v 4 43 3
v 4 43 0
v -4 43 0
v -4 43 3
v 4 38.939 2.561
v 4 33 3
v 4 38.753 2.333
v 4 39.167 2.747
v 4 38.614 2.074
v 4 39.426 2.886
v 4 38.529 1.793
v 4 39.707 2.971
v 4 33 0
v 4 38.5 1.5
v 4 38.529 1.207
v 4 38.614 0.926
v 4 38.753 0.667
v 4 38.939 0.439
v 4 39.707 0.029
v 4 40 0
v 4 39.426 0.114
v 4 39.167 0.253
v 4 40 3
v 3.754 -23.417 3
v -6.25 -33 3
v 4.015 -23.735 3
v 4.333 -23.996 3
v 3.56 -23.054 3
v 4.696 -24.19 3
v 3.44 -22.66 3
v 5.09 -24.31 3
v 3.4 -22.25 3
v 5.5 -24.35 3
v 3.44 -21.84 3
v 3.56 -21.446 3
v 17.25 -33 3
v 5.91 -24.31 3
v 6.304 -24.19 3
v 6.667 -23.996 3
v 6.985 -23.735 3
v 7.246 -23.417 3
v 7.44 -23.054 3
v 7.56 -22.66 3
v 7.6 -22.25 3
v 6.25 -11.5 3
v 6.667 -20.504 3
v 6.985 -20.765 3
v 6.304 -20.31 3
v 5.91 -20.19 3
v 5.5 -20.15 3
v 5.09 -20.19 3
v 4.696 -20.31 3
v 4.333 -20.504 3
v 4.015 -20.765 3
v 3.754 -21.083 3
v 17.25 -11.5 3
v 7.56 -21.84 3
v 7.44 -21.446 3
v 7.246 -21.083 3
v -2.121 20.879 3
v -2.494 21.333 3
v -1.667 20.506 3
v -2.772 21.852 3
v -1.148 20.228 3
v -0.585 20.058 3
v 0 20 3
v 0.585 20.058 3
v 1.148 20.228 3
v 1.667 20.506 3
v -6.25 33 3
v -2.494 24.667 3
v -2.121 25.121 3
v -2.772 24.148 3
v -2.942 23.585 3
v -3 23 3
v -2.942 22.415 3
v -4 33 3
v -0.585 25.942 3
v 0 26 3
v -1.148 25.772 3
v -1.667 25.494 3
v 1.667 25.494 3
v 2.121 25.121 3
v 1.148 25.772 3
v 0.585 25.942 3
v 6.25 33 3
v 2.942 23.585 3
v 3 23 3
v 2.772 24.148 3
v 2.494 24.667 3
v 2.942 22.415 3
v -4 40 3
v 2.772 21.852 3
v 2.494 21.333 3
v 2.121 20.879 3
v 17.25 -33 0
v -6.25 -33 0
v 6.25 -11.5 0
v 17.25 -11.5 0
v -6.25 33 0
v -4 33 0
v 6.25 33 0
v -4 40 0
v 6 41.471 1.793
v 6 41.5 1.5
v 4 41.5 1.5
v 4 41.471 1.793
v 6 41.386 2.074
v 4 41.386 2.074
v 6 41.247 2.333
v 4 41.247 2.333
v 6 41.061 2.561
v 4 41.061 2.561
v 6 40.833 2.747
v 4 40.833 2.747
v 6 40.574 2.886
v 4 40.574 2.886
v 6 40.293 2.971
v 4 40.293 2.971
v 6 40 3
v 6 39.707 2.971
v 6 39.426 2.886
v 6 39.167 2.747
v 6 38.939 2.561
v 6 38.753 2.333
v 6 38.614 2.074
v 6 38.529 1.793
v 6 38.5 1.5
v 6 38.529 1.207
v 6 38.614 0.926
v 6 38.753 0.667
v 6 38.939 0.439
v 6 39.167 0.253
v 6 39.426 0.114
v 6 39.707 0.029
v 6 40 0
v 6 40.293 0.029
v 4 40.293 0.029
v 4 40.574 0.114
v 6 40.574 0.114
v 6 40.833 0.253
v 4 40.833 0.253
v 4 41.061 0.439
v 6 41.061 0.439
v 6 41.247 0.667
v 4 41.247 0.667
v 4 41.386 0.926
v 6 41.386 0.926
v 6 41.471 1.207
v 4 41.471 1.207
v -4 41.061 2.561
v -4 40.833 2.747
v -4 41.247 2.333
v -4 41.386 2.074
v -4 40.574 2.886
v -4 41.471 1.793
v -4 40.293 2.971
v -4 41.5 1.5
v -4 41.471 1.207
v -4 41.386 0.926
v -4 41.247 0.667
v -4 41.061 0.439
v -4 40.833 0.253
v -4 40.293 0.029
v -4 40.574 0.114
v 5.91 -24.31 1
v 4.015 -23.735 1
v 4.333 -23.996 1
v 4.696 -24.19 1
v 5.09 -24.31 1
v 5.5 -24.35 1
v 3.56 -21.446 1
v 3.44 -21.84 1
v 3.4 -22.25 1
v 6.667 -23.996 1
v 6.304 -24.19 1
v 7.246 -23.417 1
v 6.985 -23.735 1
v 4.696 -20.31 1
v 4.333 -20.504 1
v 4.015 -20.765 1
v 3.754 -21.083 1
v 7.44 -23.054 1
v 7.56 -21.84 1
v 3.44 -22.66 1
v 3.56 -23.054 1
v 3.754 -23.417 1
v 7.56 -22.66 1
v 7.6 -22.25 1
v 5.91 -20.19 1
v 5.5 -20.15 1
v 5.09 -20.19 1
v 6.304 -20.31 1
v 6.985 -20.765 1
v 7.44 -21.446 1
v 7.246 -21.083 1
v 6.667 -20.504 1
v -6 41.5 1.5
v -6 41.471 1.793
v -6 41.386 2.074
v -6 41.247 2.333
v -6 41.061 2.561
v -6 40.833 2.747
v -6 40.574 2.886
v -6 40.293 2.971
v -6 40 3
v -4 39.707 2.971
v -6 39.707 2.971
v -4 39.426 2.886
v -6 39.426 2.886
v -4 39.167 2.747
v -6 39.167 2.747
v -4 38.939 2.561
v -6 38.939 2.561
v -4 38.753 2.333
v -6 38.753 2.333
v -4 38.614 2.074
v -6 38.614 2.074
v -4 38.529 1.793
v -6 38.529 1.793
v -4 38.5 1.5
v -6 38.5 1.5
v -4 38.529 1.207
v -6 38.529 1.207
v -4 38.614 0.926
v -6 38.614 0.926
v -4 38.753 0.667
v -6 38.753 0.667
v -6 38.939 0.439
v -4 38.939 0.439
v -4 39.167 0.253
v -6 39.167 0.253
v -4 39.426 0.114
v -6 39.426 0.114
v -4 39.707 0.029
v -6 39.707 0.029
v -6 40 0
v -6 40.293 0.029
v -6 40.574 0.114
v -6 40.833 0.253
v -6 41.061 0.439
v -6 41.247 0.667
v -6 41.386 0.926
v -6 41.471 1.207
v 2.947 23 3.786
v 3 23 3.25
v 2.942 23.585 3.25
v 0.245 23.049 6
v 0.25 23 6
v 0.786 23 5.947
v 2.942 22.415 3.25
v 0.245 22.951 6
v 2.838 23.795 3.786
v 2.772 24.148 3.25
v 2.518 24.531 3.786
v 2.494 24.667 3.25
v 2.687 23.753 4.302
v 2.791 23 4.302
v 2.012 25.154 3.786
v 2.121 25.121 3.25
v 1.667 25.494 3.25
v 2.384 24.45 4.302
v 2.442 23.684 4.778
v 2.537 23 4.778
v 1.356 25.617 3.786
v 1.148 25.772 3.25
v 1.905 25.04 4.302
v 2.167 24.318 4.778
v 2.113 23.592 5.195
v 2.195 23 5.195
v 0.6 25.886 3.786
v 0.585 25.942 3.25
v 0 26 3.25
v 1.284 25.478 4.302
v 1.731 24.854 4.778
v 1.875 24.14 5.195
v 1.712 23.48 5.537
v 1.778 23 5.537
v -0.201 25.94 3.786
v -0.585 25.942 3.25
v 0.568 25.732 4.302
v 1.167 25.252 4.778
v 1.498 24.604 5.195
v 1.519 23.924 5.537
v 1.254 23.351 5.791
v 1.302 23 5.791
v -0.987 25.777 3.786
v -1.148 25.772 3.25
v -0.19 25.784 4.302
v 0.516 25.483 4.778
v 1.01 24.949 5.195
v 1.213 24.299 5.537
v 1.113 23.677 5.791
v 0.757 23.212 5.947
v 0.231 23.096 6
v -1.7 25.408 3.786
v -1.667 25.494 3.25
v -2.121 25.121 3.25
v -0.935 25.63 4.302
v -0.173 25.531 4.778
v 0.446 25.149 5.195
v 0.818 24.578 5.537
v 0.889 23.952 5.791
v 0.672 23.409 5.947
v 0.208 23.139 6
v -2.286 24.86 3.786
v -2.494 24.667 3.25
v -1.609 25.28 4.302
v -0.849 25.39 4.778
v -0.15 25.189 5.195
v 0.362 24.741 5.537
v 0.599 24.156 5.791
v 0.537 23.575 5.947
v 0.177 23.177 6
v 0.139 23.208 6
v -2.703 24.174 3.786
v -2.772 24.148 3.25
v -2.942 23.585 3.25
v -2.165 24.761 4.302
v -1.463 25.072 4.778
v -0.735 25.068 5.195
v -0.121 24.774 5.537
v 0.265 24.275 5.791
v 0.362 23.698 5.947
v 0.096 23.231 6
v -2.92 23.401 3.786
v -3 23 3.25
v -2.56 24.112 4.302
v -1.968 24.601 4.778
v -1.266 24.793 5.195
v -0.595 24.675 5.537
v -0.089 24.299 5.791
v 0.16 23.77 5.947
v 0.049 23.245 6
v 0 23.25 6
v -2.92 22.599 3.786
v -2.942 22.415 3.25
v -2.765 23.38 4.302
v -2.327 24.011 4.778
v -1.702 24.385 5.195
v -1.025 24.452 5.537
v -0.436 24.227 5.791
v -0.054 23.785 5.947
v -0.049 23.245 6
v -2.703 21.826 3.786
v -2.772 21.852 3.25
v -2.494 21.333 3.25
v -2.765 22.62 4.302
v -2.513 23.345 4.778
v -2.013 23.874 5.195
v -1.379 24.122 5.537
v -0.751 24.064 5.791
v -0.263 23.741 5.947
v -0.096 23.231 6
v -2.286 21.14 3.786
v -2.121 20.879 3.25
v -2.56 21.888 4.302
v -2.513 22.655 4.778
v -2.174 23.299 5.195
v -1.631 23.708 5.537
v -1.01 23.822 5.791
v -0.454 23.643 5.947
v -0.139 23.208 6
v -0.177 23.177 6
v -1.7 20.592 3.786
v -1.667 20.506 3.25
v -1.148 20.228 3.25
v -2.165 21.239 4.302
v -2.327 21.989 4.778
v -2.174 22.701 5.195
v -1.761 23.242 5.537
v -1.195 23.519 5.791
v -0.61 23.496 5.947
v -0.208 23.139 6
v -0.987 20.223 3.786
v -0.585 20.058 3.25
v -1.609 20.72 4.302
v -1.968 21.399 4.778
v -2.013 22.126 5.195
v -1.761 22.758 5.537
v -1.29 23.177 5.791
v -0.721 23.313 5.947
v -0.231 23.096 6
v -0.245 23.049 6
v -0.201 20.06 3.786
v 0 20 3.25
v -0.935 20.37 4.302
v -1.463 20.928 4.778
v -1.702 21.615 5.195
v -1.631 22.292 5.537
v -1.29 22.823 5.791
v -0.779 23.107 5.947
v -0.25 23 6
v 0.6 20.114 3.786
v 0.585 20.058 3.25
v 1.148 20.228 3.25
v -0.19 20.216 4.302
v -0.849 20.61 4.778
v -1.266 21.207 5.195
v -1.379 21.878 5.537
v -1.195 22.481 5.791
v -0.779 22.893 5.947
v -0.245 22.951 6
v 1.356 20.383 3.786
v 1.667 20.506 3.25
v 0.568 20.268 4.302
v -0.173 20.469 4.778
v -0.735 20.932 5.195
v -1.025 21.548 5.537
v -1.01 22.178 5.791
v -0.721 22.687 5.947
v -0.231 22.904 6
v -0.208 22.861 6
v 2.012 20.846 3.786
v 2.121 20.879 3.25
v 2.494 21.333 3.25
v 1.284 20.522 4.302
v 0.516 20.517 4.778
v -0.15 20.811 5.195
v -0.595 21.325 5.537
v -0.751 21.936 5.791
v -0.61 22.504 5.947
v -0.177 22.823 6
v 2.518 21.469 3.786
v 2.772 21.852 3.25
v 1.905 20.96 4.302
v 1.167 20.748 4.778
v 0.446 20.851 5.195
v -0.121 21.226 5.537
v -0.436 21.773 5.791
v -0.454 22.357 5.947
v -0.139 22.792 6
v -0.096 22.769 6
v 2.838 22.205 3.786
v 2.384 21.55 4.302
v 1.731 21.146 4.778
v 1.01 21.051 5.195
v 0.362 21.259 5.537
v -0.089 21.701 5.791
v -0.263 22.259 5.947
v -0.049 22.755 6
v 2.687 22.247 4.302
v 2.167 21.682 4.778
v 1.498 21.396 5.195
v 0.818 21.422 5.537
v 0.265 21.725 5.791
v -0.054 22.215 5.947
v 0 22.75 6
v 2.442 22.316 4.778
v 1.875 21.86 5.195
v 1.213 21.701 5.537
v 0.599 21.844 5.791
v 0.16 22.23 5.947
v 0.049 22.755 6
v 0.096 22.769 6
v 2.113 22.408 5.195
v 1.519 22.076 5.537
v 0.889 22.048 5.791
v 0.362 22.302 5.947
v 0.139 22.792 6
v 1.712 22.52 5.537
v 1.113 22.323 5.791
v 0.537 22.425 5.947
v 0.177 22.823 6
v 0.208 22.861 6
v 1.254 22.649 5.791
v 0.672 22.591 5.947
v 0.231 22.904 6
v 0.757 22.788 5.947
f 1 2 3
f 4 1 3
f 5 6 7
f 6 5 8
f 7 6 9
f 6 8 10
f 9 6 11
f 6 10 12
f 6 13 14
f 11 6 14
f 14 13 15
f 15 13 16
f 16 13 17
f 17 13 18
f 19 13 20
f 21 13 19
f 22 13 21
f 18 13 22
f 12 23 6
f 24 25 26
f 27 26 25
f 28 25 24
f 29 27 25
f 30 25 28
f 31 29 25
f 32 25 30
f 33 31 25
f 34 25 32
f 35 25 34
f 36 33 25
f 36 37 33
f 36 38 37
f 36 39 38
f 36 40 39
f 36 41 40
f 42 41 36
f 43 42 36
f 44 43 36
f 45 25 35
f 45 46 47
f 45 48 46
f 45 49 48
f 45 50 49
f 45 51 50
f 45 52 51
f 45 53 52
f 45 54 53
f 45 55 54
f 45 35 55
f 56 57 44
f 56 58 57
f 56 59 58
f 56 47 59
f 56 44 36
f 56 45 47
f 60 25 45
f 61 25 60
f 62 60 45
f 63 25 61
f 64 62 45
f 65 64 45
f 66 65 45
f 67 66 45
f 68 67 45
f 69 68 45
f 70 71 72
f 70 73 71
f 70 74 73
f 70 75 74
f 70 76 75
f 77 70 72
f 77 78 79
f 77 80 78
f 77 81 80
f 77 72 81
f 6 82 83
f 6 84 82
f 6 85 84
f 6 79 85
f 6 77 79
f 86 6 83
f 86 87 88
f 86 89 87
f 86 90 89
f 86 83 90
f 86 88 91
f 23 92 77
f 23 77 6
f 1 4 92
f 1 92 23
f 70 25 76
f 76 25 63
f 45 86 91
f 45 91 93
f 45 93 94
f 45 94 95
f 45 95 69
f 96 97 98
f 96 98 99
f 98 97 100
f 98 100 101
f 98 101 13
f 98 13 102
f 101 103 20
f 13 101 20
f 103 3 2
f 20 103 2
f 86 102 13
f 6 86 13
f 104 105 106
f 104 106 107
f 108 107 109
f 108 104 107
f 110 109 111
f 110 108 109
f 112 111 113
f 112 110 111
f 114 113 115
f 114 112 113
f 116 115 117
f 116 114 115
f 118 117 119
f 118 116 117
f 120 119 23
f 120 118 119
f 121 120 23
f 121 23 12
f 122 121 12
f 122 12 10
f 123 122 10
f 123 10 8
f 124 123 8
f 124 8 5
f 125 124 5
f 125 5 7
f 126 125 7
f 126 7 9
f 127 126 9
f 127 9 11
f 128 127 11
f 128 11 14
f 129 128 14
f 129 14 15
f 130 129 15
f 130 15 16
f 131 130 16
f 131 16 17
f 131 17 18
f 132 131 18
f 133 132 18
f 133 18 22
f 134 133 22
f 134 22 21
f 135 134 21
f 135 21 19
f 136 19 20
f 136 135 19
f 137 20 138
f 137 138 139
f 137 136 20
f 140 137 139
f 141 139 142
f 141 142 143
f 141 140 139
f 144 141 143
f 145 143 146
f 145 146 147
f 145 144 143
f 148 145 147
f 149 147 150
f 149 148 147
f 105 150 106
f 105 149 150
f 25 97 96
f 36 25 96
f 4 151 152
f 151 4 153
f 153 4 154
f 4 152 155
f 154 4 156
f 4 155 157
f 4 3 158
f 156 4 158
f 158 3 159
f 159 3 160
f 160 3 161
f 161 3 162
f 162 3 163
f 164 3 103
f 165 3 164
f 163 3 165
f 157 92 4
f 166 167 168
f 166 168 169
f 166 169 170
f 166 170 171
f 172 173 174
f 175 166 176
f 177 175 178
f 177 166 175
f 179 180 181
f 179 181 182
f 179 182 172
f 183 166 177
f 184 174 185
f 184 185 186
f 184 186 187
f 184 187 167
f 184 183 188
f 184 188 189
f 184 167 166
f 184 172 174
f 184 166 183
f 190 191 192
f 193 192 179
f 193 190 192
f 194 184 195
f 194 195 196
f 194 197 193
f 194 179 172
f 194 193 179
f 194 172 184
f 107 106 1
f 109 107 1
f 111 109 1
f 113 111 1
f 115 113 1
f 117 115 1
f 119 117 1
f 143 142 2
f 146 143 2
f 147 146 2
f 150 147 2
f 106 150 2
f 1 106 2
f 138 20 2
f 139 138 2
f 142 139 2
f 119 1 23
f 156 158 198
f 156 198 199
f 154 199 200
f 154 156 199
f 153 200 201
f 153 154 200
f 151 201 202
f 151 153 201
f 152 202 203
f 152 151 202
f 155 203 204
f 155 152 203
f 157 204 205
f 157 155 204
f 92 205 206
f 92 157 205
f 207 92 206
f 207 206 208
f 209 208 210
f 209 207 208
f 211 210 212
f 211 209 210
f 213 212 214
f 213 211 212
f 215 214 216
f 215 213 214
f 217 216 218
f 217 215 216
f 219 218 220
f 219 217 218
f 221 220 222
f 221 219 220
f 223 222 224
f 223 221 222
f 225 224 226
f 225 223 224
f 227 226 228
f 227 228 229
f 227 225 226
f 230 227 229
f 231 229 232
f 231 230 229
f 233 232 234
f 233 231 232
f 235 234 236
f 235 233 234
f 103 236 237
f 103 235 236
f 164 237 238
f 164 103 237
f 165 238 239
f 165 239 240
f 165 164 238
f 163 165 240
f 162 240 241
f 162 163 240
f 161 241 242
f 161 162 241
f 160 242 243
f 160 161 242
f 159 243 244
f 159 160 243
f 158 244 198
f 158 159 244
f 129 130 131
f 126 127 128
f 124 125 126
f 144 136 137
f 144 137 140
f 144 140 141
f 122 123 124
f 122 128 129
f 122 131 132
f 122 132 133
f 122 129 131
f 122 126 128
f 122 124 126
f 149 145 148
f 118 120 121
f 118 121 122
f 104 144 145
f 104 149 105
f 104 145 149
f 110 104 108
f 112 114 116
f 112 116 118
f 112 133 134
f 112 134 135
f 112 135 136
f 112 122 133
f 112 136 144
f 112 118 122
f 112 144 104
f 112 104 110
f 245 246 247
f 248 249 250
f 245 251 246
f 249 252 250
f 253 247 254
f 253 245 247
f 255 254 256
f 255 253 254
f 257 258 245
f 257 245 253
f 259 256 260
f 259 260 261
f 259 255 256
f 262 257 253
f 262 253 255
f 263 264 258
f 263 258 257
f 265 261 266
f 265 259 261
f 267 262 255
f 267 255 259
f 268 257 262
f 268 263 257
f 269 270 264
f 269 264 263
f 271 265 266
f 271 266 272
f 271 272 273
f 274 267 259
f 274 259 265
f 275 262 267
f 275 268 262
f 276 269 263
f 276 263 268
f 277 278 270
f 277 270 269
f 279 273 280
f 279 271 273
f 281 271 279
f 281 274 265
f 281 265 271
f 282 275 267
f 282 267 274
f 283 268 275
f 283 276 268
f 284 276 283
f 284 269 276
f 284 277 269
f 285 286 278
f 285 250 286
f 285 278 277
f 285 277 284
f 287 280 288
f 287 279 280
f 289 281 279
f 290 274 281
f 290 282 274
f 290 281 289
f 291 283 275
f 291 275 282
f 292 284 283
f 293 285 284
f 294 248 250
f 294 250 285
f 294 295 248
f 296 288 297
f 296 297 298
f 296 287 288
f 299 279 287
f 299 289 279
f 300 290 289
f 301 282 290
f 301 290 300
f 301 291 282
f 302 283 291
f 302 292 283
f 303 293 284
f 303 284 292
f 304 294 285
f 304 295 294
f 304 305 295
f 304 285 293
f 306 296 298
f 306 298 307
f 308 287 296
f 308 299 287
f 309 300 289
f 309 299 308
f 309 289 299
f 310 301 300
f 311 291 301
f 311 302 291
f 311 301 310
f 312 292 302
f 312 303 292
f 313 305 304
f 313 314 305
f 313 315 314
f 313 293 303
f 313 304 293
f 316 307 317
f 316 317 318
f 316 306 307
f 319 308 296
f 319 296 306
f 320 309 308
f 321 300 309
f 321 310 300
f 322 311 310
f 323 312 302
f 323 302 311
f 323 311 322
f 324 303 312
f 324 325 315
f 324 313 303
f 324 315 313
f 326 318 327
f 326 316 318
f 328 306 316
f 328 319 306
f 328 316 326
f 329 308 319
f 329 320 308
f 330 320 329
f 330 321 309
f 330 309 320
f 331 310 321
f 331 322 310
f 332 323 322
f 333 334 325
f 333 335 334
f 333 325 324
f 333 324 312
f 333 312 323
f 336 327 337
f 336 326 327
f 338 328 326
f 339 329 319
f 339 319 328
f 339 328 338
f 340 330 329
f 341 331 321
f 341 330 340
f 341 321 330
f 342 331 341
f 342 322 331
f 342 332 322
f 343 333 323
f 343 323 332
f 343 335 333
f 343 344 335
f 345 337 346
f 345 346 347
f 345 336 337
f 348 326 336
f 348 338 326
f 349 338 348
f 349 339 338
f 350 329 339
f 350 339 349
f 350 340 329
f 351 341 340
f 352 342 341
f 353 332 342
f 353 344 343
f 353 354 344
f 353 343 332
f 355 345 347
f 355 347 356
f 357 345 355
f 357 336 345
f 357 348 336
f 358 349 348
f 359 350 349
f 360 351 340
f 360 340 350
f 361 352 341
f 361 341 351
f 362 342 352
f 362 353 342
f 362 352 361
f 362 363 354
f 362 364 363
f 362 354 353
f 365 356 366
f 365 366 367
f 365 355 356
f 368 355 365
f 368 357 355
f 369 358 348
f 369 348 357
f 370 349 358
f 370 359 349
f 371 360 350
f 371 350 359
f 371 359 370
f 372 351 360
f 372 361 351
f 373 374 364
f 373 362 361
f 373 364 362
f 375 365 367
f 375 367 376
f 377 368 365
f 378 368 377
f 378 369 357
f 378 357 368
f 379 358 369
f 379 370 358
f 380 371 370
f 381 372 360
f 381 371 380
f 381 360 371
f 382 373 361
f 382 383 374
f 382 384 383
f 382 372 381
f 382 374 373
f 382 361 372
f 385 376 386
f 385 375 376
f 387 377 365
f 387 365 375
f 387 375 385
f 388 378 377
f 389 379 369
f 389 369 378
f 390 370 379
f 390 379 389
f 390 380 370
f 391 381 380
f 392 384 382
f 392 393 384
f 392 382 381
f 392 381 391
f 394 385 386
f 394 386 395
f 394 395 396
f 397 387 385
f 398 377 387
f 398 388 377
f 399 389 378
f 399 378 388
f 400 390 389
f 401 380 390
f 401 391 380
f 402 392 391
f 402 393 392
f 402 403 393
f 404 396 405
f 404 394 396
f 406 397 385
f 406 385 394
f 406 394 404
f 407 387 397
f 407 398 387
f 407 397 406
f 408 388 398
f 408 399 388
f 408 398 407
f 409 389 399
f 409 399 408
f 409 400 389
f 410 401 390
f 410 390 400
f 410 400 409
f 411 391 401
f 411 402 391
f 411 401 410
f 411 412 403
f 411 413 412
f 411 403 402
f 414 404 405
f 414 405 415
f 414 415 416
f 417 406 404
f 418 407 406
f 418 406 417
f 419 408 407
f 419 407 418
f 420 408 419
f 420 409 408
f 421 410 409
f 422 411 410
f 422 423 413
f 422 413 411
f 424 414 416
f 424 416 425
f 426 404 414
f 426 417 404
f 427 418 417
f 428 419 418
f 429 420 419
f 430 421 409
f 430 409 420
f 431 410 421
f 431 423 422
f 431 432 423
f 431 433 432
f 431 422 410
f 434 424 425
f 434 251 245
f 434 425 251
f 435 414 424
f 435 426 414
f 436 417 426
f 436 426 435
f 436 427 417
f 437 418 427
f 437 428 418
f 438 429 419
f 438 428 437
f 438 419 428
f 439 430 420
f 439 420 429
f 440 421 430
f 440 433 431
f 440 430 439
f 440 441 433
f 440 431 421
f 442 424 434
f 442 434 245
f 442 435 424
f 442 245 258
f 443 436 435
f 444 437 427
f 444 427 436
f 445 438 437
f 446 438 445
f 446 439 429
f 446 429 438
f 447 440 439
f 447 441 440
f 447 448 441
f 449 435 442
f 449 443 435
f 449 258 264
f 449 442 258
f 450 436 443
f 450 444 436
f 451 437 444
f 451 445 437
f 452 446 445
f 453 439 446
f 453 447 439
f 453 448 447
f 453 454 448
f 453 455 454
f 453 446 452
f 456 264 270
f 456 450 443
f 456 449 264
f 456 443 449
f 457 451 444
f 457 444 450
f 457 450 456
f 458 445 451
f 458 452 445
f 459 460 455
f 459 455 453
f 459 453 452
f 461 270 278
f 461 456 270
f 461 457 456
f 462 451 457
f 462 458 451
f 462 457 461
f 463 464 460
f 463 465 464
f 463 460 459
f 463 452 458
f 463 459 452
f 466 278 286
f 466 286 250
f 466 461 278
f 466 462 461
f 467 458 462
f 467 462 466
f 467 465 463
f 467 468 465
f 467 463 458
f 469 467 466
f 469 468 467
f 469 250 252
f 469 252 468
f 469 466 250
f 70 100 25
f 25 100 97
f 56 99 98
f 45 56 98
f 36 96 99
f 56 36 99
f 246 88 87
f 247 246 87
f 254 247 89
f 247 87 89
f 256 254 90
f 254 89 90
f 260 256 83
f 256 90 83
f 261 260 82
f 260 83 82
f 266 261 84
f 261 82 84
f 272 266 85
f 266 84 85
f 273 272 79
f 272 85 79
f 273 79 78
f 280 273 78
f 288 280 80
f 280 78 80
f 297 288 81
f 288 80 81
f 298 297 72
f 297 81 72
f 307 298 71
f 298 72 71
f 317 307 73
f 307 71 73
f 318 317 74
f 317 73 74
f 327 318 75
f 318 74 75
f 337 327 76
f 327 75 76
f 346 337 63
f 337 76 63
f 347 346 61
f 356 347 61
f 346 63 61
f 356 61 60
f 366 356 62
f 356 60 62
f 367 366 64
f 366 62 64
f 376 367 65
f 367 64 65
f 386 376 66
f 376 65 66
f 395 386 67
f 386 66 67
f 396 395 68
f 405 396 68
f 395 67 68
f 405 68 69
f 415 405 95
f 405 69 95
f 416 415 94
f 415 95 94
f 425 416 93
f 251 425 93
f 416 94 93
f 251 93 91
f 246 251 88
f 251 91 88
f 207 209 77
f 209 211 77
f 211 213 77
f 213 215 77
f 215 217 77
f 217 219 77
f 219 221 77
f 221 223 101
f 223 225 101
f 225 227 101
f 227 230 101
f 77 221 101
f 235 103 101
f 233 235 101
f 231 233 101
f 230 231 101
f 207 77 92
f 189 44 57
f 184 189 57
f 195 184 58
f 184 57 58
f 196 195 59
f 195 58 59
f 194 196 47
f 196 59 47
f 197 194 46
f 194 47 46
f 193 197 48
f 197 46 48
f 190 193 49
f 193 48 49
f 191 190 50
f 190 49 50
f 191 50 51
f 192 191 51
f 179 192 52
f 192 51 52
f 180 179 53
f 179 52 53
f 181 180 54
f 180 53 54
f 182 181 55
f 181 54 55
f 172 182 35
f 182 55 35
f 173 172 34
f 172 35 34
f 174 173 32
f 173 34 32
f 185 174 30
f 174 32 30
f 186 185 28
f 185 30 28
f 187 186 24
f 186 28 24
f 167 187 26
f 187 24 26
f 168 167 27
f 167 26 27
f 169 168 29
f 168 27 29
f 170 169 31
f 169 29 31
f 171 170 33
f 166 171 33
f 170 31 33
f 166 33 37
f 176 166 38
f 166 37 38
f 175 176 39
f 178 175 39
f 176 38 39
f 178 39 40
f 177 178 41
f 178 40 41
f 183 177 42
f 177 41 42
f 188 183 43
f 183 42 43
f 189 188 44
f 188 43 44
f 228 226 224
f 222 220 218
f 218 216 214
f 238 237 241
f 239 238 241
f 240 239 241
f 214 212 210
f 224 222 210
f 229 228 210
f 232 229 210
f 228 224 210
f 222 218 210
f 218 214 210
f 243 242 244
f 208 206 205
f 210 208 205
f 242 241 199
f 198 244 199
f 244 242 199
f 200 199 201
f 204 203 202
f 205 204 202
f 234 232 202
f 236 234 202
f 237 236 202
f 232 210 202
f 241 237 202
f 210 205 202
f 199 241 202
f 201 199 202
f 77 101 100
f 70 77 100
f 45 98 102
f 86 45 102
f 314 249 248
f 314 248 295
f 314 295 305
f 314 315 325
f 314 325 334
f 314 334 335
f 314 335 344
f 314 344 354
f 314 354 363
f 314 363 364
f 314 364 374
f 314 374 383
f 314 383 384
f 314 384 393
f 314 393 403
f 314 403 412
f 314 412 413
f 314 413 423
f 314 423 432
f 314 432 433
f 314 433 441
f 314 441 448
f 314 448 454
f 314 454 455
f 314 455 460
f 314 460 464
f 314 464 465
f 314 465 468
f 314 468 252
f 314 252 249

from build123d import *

# Parameters (mm, degrees)
PAD_DEPTH    = 3
SKETCH001_R  = 1.5
PAD001_DEPTH = 6
SKETCH002_R  = 2.1
POCKET_DEPTH = 2
SKETCH003_R  = 3
PAD002_DEPTH = 3
FILLET_R     = 2.75


with BuildPart() as part:
    # Sketch → Pad (new body)
    with BuildSketch(Plane.XY):
        Polygon((-6.25, 33), (-6.25, -33), (17.25, -33), (17.25, -11.5), (6.25, -11.5), (6.25, 33), (4, 33), (4, 43), (-4, 43), (-4, 33), align=None)
    extrude(amount=PAD_DEPTH)

    # Sketch001 → Pad001 (join, symmetric)
    with BuildSketch(Plane.YZ):
        with Locations((40, 1.5)):
            Circle(SKETCH001_R)
    extrude(amount=PAD001_DEPTH, both=True)

    # Sketch002 (on Face5 of Pad001) → Pocket (cut)
    with BuildSketch(Plane.XY.offset(3)):
        with Locations((5.5, -22.25)):
            Circle(SKETCH002_R)
    extrude(amount=-POCKET_DEPTH, mode=Mode.SUBTRACT)

    # Sketch003 (on Face5 of Pocket) → Pad002 (join)
    with BuildSketch(Plane.XY.offset(3)):
        with Locations((0, 23)):
            Circle(SKETCH003_R)
    extrude(amount=PAD002_DEPTH)

    # Fillet
    fillet_edges = [part.edges().sort_by_distance(p)[0] for p in [
        (-3, 23, 6),
    ]]
    fillet(fillet_edges, radius=FILLET_R)


solid = part.part
